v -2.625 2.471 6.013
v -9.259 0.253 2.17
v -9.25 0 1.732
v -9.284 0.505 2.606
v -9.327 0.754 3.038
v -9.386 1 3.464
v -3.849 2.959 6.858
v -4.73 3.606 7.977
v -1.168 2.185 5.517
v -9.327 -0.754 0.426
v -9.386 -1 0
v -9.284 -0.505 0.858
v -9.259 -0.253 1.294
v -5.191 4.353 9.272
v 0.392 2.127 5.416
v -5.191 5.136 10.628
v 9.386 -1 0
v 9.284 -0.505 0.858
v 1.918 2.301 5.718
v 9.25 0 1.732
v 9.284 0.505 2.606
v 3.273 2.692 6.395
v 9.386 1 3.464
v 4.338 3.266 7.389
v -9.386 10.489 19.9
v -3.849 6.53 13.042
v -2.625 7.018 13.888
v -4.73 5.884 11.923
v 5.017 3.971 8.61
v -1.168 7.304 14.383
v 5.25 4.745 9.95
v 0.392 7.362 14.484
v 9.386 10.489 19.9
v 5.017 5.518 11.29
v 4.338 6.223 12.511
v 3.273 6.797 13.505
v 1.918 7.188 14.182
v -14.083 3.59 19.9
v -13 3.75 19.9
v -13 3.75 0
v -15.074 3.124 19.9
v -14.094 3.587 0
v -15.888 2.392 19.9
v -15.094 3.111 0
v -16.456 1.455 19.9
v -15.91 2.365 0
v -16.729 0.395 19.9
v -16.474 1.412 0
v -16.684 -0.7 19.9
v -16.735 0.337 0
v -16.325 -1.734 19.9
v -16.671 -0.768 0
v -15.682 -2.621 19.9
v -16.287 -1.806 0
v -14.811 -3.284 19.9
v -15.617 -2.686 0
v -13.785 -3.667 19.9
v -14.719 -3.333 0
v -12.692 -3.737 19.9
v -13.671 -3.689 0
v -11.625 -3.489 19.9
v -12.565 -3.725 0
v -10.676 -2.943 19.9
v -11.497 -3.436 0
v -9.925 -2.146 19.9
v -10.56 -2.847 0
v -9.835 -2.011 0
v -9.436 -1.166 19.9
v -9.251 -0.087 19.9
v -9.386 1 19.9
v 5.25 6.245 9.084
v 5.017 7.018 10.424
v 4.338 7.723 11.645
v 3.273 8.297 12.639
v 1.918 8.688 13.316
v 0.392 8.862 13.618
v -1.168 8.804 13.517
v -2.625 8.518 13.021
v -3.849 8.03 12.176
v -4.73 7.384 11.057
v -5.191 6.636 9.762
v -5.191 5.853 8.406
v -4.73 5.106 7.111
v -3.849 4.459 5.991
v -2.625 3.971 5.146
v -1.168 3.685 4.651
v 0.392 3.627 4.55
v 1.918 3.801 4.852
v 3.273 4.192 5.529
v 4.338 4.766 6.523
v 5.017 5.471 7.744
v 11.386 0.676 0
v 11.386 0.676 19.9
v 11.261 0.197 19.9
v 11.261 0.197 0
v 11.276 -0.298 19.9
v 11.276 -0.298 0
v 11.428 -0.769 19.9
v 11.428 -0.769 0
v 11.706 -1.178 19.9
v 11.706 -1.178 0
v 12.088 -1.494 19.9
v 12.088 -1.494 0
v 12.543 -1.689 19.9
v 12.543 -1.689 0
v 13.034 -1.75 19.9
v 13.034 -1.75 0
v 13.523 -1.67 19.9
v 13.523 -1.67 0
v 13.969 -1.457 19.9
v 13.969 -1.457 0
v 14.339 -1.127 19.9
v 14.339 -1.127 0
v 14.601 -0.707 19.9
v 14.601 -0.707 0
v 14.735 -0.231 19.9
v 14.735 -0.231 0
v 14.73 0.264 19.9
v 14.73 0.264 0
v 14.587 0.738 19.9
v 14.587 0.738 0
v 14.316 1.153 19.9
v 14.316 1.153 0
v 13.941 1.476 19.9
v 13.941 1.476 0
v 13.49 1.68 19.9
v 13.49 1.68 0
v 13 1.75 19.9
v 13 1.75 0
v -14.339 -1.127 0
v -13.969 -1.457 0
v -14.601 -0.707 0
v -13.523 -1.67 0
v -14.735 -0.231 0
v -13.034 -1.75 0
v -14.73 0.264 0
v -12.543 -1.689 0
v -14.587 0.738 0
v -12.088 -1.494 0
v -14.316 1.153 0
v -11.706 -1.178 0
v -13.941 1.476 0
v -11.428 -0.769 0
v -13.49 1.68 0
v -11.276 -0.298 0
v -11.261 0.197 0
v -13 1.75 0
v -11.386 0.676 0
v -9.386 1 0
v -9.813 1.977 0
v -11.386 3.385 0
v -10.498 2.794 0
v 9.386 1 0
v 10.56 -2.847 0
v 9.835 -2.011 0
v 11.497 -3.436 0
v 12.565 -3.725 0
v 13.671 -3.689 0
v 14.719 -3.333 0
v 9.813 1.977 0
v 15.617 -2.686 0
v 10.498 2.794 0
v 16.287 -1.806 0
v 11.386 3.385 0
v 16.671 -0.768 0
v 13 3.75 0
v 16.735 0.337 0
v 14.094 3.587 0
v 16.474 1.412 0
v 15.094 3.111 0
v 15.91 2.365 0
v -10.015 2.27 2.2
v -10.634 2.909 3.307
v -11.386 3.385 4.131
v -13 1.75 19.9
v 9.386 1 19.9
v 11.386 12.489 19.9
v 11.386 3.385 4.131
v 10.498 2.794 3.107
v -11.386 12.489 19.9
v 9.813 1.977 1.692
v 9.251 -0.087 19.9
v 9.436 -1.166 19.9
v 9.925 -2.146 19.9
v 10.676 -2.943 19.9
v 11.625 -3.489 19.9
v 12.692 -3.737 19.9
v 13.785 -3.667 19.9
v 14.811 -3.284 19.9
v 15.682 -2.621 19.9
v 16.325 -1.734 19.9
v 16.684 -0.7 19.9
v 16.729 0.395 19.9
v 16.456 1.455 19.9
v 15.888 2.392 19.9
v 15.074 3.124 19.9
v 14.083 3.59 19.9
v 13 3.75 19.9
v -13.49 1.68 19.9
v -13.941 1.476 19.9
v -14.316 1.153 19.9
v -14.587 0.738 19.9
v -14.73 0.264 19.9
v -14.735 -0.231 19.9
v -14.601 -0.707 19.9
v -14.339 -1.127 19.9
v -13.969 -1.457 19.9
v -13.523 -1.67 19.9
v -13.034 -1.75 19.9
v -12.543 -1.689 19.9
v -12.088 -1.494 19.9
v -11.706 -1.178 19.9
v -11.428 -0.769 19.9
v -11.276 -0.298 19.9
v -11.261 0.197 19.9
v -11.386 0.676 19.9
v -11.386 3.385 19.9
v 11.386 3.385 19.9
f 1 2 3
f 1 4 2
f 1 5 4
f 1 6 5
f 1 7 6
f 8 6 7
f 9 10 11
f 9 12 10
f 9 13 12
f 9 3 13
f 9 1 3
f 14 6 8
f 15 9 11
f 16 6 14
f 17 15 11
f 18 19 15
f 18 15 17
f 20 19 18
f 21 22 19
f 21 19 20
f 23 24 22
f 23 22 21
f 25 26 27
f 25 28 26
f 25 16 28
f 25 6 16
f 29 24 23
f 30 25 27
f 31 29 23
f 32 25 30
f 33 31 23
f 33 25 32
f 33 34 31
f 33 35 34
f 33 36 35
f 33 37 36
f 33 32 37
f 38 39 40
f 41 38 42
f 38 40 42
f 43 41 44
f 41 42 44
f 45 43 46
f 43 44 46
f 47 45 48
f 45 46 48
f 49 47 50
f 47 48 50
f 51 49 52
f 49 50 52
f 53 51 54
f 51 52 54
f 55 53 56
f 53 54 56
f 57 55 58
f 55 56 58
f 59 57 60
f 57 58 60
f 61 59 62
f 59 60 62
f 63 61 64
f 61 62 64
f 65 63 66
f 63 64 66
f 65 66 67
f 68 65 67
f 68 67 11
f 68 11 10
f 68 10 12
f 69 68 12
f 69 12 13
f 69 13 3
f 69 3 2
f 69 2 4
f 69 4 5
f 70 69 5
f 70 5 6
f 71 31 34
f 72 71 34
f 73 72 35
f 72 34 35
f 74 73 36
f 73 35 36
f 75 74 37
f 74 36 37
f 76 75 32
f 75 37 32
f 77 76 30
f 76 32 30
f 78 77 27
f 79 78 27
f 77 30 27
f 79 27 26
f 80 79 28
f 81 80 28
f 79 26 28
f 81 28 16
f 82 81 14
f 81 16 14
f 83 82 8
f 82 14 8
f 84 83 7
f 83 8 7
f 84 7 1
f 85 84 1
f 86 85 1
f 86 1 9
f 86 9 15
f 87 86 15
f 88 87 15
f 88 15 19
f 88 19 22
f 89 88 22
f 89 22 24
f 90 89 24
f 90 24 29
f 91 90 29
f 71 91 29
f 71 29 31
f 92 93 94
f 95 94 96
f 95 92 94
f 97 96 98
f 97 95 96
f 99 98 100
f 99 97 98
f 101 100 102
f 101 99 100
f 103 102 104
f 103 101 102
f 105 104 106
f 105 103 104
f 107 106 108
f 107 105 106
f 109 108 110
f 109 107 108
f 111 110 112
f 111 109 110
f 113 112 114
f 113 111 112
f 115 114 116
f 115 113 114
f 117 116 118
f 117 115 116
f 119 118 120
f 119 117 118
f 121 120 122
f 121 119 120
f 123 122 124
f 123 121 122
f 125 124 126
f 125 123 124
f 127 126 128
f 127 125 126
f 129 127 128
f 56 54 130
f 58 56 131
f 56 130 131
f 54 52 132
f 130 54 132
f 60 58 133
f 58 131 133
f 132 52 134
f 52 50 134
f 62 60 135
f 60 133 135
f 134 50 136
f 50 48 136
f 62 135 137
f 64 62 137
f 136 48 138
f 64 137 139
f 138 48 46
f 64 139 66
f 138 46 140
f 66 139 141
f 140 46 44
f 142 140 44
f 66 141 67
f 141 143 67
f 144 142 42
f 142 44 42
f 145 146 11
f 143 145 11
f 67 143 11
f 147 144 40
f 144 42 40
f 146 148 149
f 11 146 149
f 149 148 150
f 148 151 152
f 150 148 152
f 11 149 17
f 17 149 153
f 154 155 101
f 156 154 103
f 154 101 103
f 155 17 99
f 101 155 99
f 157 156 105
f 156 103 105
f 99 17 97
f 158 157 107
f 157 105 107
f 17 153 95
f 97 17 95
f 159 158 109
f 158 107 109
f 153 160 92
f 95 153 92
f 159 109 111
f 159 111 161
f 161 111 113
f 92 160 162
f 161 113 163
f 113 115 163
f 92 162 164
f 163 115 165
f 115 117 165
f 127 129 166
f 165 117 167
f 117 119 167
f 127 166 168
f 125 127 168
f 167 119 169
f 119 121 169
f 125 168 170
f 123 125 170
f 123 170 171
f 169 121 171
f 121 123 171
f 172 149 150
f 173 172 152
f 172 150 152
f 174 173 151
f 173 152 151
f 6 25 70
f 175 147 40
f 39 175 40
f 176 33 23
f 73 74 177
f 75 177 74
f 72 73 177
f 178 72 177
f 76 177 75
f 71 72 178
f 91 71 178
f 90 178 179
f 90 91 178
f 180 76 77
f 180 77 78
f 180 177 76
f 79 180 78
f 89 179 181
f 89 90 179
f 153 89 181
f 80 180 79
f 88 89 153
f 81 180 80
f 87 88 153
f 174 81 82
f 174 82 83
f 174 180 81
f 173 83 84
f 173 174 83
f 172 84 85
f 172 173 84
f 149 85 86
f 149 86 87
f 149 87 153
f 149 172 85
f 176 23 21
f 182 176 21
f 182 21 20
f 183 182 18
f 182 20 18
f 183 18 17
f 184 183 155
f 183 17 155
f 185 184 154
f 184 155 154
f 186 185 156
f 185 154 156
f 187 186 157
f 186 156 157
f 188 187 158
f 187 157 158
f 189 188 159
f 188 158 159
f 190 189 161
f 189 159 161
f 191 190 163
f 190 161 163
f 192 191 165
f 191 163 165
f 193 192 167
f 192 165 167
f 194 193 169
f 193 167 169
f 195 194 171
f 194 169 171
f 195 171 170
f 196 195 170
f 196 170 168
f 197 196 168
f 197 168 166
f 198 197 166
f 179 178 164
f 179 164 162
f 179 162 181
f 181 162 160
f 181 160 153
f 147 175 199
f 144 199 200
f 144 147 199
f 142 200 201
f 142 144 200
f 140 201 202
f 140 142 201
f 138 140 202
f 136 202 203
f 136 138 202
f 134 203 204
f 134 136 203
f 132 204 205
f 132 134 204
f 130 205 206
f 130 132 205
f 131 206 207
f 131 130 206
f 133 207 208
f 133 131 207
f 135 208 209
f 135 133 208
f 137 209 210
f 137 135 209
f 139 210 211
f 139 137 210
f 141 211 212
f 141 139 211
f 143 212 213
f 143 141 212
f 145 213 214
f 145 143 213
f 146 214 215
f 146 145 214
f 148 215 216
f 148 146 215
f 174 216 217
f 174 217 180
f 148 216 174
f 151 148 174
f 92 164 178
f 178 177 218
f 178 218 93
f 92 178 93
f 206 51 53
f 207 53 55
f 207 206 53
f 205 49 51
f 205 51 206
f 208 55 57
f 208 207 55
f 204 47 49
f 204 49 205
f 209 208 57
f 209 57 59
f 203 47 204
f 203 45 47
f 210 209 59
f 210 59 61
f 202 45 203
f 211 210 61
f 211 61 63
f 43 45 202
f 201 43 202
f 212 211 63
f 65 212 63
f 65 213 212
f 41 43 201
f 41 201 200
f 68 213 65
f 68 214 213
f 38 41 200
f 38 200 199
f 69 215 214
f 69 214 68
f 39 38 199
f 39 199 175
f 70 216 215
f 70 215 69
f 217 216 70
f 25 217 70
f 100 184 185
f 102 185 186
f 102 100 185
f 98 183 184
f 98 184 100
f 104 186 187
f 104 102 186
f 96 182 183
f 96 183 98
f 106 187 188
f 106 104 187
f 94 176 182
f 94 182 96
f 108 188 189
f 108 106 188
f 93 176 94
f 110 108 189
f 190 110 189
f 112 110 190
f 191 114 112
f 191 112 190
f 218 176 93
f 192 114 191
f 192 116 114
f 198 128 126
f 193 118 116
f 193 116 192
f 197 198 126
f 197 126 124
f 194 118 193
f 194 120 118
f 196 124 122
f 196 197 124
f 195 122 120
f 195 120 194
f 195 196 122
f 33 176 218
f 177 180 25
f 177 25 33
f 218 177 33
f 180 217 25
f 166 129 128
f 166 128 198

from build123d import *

# Parameters (mm, degrees)
F0_R      = 3.75
F0_R_2    = 1.75
F1_DEPTH  = 19.9
F2_W      = 18.7715838526
F2_H      = 2
F5_W      = 18.7715838526
F5_H      = 2
F8_R      = 5.25
F9_DEPTH  = 11.6830509442
F11_DEPTH = 2
F12_W     = 1.6142080737
F12_H     = 6.9905174896
F13_DEPTH = 19.9010001


# Not quite as in the source:
# - a pattern or mirror of a feature is missing from the dataset's text; its kind, count and spacing are read off the source's solid


with BuildPart() as f1:
    # F0 (on Top) → F1 (new body)
    with BuildSketch(Plane.XY):
        with Locations((13, 0)):
            Circle(F0_R)
        with Locations((13, 0)):
            Circle(F0_R_2, mode=Mode.SUBTRACT)
    extrude(amount=F1_DEPTH)



with BuildPart() as f1b:
    # F0 (on Top) → F1, piece 2 (new body)
    with BuildSketch(Plane.XY):
        with Locations((-13, 0)):
            Circle(F0_R)
        with Locations((-13, 0)):
            Circle(F0_R_2, mode=Mode.SUBTRACT)
    extrude(amount=F1_DEPTH)


with BuildPart() as f1_1:
    add(f1.part)

    add(f1b.part)  # F6 merges F1b
    # F2 (on Top) → F6 section 0
    with BuildSketch(Plane.XY):
        Rectangle(F2_W, F2_H)
    # F5 (on offset) → F6 section 1
    with BuildSketch(Plane.XY.offset(19.9)):
        with Locations((0, 11.4892703569)):
            Rectangle(F5_W, F5_H)
    loft()

    # F8 (on offset) → F9 (cut, through all)
    with BuildSketch(Plane(origin=(0, -0.75, 0.4330127019), x_dir=(1, 0, 0), z_dir=(0, -0.8660254038, 0.5))):
        with Locations((0, 10.9892703569)):
            Circle(F8_R)
    extrude(amount=-F9_DEPTH, mode=Mode.SUBTRACT)

    # F10 (on face) → F11 (join)
    with BuildSketch(Plane(origin=(-9.3857919263, 0, 0), x_dir=(0, -1, 0), z_dir=(-1, 0, 0))):
        Polygon((-1, 19.9), (-12.4892703569, 19.9), (-1, 0), (-1, 3.4641016151), align=None)
    f11 = extrude(amount=F11_DEPTH)

    # F11_copies: F11 across plane
    add(f11.mirror(Plane(origin=(0, 0, 0), x_dir=(0, 0, 1), z_dir=(1, 0, 0))))

    # F12 (on Top) → F13 (cut, through all)
    with BuildSketch(Plane.XY):
        with Locations((-12.1928959631, 3.4952587448)):
            Rectangle(F12_W, F12_H)
    f13 = extrude(amount=F13_DEPTH, mode=Mode.SUBTRACT)

    # F13_copies: F13 across plane
    add(f13.mirror(Plane(origin=(0, 0, 0), x_dir=(0, 0, 1), z_dir=(1, 0, 0))), mode=Mode.SUBTRACT)


solid = f1_1.part
